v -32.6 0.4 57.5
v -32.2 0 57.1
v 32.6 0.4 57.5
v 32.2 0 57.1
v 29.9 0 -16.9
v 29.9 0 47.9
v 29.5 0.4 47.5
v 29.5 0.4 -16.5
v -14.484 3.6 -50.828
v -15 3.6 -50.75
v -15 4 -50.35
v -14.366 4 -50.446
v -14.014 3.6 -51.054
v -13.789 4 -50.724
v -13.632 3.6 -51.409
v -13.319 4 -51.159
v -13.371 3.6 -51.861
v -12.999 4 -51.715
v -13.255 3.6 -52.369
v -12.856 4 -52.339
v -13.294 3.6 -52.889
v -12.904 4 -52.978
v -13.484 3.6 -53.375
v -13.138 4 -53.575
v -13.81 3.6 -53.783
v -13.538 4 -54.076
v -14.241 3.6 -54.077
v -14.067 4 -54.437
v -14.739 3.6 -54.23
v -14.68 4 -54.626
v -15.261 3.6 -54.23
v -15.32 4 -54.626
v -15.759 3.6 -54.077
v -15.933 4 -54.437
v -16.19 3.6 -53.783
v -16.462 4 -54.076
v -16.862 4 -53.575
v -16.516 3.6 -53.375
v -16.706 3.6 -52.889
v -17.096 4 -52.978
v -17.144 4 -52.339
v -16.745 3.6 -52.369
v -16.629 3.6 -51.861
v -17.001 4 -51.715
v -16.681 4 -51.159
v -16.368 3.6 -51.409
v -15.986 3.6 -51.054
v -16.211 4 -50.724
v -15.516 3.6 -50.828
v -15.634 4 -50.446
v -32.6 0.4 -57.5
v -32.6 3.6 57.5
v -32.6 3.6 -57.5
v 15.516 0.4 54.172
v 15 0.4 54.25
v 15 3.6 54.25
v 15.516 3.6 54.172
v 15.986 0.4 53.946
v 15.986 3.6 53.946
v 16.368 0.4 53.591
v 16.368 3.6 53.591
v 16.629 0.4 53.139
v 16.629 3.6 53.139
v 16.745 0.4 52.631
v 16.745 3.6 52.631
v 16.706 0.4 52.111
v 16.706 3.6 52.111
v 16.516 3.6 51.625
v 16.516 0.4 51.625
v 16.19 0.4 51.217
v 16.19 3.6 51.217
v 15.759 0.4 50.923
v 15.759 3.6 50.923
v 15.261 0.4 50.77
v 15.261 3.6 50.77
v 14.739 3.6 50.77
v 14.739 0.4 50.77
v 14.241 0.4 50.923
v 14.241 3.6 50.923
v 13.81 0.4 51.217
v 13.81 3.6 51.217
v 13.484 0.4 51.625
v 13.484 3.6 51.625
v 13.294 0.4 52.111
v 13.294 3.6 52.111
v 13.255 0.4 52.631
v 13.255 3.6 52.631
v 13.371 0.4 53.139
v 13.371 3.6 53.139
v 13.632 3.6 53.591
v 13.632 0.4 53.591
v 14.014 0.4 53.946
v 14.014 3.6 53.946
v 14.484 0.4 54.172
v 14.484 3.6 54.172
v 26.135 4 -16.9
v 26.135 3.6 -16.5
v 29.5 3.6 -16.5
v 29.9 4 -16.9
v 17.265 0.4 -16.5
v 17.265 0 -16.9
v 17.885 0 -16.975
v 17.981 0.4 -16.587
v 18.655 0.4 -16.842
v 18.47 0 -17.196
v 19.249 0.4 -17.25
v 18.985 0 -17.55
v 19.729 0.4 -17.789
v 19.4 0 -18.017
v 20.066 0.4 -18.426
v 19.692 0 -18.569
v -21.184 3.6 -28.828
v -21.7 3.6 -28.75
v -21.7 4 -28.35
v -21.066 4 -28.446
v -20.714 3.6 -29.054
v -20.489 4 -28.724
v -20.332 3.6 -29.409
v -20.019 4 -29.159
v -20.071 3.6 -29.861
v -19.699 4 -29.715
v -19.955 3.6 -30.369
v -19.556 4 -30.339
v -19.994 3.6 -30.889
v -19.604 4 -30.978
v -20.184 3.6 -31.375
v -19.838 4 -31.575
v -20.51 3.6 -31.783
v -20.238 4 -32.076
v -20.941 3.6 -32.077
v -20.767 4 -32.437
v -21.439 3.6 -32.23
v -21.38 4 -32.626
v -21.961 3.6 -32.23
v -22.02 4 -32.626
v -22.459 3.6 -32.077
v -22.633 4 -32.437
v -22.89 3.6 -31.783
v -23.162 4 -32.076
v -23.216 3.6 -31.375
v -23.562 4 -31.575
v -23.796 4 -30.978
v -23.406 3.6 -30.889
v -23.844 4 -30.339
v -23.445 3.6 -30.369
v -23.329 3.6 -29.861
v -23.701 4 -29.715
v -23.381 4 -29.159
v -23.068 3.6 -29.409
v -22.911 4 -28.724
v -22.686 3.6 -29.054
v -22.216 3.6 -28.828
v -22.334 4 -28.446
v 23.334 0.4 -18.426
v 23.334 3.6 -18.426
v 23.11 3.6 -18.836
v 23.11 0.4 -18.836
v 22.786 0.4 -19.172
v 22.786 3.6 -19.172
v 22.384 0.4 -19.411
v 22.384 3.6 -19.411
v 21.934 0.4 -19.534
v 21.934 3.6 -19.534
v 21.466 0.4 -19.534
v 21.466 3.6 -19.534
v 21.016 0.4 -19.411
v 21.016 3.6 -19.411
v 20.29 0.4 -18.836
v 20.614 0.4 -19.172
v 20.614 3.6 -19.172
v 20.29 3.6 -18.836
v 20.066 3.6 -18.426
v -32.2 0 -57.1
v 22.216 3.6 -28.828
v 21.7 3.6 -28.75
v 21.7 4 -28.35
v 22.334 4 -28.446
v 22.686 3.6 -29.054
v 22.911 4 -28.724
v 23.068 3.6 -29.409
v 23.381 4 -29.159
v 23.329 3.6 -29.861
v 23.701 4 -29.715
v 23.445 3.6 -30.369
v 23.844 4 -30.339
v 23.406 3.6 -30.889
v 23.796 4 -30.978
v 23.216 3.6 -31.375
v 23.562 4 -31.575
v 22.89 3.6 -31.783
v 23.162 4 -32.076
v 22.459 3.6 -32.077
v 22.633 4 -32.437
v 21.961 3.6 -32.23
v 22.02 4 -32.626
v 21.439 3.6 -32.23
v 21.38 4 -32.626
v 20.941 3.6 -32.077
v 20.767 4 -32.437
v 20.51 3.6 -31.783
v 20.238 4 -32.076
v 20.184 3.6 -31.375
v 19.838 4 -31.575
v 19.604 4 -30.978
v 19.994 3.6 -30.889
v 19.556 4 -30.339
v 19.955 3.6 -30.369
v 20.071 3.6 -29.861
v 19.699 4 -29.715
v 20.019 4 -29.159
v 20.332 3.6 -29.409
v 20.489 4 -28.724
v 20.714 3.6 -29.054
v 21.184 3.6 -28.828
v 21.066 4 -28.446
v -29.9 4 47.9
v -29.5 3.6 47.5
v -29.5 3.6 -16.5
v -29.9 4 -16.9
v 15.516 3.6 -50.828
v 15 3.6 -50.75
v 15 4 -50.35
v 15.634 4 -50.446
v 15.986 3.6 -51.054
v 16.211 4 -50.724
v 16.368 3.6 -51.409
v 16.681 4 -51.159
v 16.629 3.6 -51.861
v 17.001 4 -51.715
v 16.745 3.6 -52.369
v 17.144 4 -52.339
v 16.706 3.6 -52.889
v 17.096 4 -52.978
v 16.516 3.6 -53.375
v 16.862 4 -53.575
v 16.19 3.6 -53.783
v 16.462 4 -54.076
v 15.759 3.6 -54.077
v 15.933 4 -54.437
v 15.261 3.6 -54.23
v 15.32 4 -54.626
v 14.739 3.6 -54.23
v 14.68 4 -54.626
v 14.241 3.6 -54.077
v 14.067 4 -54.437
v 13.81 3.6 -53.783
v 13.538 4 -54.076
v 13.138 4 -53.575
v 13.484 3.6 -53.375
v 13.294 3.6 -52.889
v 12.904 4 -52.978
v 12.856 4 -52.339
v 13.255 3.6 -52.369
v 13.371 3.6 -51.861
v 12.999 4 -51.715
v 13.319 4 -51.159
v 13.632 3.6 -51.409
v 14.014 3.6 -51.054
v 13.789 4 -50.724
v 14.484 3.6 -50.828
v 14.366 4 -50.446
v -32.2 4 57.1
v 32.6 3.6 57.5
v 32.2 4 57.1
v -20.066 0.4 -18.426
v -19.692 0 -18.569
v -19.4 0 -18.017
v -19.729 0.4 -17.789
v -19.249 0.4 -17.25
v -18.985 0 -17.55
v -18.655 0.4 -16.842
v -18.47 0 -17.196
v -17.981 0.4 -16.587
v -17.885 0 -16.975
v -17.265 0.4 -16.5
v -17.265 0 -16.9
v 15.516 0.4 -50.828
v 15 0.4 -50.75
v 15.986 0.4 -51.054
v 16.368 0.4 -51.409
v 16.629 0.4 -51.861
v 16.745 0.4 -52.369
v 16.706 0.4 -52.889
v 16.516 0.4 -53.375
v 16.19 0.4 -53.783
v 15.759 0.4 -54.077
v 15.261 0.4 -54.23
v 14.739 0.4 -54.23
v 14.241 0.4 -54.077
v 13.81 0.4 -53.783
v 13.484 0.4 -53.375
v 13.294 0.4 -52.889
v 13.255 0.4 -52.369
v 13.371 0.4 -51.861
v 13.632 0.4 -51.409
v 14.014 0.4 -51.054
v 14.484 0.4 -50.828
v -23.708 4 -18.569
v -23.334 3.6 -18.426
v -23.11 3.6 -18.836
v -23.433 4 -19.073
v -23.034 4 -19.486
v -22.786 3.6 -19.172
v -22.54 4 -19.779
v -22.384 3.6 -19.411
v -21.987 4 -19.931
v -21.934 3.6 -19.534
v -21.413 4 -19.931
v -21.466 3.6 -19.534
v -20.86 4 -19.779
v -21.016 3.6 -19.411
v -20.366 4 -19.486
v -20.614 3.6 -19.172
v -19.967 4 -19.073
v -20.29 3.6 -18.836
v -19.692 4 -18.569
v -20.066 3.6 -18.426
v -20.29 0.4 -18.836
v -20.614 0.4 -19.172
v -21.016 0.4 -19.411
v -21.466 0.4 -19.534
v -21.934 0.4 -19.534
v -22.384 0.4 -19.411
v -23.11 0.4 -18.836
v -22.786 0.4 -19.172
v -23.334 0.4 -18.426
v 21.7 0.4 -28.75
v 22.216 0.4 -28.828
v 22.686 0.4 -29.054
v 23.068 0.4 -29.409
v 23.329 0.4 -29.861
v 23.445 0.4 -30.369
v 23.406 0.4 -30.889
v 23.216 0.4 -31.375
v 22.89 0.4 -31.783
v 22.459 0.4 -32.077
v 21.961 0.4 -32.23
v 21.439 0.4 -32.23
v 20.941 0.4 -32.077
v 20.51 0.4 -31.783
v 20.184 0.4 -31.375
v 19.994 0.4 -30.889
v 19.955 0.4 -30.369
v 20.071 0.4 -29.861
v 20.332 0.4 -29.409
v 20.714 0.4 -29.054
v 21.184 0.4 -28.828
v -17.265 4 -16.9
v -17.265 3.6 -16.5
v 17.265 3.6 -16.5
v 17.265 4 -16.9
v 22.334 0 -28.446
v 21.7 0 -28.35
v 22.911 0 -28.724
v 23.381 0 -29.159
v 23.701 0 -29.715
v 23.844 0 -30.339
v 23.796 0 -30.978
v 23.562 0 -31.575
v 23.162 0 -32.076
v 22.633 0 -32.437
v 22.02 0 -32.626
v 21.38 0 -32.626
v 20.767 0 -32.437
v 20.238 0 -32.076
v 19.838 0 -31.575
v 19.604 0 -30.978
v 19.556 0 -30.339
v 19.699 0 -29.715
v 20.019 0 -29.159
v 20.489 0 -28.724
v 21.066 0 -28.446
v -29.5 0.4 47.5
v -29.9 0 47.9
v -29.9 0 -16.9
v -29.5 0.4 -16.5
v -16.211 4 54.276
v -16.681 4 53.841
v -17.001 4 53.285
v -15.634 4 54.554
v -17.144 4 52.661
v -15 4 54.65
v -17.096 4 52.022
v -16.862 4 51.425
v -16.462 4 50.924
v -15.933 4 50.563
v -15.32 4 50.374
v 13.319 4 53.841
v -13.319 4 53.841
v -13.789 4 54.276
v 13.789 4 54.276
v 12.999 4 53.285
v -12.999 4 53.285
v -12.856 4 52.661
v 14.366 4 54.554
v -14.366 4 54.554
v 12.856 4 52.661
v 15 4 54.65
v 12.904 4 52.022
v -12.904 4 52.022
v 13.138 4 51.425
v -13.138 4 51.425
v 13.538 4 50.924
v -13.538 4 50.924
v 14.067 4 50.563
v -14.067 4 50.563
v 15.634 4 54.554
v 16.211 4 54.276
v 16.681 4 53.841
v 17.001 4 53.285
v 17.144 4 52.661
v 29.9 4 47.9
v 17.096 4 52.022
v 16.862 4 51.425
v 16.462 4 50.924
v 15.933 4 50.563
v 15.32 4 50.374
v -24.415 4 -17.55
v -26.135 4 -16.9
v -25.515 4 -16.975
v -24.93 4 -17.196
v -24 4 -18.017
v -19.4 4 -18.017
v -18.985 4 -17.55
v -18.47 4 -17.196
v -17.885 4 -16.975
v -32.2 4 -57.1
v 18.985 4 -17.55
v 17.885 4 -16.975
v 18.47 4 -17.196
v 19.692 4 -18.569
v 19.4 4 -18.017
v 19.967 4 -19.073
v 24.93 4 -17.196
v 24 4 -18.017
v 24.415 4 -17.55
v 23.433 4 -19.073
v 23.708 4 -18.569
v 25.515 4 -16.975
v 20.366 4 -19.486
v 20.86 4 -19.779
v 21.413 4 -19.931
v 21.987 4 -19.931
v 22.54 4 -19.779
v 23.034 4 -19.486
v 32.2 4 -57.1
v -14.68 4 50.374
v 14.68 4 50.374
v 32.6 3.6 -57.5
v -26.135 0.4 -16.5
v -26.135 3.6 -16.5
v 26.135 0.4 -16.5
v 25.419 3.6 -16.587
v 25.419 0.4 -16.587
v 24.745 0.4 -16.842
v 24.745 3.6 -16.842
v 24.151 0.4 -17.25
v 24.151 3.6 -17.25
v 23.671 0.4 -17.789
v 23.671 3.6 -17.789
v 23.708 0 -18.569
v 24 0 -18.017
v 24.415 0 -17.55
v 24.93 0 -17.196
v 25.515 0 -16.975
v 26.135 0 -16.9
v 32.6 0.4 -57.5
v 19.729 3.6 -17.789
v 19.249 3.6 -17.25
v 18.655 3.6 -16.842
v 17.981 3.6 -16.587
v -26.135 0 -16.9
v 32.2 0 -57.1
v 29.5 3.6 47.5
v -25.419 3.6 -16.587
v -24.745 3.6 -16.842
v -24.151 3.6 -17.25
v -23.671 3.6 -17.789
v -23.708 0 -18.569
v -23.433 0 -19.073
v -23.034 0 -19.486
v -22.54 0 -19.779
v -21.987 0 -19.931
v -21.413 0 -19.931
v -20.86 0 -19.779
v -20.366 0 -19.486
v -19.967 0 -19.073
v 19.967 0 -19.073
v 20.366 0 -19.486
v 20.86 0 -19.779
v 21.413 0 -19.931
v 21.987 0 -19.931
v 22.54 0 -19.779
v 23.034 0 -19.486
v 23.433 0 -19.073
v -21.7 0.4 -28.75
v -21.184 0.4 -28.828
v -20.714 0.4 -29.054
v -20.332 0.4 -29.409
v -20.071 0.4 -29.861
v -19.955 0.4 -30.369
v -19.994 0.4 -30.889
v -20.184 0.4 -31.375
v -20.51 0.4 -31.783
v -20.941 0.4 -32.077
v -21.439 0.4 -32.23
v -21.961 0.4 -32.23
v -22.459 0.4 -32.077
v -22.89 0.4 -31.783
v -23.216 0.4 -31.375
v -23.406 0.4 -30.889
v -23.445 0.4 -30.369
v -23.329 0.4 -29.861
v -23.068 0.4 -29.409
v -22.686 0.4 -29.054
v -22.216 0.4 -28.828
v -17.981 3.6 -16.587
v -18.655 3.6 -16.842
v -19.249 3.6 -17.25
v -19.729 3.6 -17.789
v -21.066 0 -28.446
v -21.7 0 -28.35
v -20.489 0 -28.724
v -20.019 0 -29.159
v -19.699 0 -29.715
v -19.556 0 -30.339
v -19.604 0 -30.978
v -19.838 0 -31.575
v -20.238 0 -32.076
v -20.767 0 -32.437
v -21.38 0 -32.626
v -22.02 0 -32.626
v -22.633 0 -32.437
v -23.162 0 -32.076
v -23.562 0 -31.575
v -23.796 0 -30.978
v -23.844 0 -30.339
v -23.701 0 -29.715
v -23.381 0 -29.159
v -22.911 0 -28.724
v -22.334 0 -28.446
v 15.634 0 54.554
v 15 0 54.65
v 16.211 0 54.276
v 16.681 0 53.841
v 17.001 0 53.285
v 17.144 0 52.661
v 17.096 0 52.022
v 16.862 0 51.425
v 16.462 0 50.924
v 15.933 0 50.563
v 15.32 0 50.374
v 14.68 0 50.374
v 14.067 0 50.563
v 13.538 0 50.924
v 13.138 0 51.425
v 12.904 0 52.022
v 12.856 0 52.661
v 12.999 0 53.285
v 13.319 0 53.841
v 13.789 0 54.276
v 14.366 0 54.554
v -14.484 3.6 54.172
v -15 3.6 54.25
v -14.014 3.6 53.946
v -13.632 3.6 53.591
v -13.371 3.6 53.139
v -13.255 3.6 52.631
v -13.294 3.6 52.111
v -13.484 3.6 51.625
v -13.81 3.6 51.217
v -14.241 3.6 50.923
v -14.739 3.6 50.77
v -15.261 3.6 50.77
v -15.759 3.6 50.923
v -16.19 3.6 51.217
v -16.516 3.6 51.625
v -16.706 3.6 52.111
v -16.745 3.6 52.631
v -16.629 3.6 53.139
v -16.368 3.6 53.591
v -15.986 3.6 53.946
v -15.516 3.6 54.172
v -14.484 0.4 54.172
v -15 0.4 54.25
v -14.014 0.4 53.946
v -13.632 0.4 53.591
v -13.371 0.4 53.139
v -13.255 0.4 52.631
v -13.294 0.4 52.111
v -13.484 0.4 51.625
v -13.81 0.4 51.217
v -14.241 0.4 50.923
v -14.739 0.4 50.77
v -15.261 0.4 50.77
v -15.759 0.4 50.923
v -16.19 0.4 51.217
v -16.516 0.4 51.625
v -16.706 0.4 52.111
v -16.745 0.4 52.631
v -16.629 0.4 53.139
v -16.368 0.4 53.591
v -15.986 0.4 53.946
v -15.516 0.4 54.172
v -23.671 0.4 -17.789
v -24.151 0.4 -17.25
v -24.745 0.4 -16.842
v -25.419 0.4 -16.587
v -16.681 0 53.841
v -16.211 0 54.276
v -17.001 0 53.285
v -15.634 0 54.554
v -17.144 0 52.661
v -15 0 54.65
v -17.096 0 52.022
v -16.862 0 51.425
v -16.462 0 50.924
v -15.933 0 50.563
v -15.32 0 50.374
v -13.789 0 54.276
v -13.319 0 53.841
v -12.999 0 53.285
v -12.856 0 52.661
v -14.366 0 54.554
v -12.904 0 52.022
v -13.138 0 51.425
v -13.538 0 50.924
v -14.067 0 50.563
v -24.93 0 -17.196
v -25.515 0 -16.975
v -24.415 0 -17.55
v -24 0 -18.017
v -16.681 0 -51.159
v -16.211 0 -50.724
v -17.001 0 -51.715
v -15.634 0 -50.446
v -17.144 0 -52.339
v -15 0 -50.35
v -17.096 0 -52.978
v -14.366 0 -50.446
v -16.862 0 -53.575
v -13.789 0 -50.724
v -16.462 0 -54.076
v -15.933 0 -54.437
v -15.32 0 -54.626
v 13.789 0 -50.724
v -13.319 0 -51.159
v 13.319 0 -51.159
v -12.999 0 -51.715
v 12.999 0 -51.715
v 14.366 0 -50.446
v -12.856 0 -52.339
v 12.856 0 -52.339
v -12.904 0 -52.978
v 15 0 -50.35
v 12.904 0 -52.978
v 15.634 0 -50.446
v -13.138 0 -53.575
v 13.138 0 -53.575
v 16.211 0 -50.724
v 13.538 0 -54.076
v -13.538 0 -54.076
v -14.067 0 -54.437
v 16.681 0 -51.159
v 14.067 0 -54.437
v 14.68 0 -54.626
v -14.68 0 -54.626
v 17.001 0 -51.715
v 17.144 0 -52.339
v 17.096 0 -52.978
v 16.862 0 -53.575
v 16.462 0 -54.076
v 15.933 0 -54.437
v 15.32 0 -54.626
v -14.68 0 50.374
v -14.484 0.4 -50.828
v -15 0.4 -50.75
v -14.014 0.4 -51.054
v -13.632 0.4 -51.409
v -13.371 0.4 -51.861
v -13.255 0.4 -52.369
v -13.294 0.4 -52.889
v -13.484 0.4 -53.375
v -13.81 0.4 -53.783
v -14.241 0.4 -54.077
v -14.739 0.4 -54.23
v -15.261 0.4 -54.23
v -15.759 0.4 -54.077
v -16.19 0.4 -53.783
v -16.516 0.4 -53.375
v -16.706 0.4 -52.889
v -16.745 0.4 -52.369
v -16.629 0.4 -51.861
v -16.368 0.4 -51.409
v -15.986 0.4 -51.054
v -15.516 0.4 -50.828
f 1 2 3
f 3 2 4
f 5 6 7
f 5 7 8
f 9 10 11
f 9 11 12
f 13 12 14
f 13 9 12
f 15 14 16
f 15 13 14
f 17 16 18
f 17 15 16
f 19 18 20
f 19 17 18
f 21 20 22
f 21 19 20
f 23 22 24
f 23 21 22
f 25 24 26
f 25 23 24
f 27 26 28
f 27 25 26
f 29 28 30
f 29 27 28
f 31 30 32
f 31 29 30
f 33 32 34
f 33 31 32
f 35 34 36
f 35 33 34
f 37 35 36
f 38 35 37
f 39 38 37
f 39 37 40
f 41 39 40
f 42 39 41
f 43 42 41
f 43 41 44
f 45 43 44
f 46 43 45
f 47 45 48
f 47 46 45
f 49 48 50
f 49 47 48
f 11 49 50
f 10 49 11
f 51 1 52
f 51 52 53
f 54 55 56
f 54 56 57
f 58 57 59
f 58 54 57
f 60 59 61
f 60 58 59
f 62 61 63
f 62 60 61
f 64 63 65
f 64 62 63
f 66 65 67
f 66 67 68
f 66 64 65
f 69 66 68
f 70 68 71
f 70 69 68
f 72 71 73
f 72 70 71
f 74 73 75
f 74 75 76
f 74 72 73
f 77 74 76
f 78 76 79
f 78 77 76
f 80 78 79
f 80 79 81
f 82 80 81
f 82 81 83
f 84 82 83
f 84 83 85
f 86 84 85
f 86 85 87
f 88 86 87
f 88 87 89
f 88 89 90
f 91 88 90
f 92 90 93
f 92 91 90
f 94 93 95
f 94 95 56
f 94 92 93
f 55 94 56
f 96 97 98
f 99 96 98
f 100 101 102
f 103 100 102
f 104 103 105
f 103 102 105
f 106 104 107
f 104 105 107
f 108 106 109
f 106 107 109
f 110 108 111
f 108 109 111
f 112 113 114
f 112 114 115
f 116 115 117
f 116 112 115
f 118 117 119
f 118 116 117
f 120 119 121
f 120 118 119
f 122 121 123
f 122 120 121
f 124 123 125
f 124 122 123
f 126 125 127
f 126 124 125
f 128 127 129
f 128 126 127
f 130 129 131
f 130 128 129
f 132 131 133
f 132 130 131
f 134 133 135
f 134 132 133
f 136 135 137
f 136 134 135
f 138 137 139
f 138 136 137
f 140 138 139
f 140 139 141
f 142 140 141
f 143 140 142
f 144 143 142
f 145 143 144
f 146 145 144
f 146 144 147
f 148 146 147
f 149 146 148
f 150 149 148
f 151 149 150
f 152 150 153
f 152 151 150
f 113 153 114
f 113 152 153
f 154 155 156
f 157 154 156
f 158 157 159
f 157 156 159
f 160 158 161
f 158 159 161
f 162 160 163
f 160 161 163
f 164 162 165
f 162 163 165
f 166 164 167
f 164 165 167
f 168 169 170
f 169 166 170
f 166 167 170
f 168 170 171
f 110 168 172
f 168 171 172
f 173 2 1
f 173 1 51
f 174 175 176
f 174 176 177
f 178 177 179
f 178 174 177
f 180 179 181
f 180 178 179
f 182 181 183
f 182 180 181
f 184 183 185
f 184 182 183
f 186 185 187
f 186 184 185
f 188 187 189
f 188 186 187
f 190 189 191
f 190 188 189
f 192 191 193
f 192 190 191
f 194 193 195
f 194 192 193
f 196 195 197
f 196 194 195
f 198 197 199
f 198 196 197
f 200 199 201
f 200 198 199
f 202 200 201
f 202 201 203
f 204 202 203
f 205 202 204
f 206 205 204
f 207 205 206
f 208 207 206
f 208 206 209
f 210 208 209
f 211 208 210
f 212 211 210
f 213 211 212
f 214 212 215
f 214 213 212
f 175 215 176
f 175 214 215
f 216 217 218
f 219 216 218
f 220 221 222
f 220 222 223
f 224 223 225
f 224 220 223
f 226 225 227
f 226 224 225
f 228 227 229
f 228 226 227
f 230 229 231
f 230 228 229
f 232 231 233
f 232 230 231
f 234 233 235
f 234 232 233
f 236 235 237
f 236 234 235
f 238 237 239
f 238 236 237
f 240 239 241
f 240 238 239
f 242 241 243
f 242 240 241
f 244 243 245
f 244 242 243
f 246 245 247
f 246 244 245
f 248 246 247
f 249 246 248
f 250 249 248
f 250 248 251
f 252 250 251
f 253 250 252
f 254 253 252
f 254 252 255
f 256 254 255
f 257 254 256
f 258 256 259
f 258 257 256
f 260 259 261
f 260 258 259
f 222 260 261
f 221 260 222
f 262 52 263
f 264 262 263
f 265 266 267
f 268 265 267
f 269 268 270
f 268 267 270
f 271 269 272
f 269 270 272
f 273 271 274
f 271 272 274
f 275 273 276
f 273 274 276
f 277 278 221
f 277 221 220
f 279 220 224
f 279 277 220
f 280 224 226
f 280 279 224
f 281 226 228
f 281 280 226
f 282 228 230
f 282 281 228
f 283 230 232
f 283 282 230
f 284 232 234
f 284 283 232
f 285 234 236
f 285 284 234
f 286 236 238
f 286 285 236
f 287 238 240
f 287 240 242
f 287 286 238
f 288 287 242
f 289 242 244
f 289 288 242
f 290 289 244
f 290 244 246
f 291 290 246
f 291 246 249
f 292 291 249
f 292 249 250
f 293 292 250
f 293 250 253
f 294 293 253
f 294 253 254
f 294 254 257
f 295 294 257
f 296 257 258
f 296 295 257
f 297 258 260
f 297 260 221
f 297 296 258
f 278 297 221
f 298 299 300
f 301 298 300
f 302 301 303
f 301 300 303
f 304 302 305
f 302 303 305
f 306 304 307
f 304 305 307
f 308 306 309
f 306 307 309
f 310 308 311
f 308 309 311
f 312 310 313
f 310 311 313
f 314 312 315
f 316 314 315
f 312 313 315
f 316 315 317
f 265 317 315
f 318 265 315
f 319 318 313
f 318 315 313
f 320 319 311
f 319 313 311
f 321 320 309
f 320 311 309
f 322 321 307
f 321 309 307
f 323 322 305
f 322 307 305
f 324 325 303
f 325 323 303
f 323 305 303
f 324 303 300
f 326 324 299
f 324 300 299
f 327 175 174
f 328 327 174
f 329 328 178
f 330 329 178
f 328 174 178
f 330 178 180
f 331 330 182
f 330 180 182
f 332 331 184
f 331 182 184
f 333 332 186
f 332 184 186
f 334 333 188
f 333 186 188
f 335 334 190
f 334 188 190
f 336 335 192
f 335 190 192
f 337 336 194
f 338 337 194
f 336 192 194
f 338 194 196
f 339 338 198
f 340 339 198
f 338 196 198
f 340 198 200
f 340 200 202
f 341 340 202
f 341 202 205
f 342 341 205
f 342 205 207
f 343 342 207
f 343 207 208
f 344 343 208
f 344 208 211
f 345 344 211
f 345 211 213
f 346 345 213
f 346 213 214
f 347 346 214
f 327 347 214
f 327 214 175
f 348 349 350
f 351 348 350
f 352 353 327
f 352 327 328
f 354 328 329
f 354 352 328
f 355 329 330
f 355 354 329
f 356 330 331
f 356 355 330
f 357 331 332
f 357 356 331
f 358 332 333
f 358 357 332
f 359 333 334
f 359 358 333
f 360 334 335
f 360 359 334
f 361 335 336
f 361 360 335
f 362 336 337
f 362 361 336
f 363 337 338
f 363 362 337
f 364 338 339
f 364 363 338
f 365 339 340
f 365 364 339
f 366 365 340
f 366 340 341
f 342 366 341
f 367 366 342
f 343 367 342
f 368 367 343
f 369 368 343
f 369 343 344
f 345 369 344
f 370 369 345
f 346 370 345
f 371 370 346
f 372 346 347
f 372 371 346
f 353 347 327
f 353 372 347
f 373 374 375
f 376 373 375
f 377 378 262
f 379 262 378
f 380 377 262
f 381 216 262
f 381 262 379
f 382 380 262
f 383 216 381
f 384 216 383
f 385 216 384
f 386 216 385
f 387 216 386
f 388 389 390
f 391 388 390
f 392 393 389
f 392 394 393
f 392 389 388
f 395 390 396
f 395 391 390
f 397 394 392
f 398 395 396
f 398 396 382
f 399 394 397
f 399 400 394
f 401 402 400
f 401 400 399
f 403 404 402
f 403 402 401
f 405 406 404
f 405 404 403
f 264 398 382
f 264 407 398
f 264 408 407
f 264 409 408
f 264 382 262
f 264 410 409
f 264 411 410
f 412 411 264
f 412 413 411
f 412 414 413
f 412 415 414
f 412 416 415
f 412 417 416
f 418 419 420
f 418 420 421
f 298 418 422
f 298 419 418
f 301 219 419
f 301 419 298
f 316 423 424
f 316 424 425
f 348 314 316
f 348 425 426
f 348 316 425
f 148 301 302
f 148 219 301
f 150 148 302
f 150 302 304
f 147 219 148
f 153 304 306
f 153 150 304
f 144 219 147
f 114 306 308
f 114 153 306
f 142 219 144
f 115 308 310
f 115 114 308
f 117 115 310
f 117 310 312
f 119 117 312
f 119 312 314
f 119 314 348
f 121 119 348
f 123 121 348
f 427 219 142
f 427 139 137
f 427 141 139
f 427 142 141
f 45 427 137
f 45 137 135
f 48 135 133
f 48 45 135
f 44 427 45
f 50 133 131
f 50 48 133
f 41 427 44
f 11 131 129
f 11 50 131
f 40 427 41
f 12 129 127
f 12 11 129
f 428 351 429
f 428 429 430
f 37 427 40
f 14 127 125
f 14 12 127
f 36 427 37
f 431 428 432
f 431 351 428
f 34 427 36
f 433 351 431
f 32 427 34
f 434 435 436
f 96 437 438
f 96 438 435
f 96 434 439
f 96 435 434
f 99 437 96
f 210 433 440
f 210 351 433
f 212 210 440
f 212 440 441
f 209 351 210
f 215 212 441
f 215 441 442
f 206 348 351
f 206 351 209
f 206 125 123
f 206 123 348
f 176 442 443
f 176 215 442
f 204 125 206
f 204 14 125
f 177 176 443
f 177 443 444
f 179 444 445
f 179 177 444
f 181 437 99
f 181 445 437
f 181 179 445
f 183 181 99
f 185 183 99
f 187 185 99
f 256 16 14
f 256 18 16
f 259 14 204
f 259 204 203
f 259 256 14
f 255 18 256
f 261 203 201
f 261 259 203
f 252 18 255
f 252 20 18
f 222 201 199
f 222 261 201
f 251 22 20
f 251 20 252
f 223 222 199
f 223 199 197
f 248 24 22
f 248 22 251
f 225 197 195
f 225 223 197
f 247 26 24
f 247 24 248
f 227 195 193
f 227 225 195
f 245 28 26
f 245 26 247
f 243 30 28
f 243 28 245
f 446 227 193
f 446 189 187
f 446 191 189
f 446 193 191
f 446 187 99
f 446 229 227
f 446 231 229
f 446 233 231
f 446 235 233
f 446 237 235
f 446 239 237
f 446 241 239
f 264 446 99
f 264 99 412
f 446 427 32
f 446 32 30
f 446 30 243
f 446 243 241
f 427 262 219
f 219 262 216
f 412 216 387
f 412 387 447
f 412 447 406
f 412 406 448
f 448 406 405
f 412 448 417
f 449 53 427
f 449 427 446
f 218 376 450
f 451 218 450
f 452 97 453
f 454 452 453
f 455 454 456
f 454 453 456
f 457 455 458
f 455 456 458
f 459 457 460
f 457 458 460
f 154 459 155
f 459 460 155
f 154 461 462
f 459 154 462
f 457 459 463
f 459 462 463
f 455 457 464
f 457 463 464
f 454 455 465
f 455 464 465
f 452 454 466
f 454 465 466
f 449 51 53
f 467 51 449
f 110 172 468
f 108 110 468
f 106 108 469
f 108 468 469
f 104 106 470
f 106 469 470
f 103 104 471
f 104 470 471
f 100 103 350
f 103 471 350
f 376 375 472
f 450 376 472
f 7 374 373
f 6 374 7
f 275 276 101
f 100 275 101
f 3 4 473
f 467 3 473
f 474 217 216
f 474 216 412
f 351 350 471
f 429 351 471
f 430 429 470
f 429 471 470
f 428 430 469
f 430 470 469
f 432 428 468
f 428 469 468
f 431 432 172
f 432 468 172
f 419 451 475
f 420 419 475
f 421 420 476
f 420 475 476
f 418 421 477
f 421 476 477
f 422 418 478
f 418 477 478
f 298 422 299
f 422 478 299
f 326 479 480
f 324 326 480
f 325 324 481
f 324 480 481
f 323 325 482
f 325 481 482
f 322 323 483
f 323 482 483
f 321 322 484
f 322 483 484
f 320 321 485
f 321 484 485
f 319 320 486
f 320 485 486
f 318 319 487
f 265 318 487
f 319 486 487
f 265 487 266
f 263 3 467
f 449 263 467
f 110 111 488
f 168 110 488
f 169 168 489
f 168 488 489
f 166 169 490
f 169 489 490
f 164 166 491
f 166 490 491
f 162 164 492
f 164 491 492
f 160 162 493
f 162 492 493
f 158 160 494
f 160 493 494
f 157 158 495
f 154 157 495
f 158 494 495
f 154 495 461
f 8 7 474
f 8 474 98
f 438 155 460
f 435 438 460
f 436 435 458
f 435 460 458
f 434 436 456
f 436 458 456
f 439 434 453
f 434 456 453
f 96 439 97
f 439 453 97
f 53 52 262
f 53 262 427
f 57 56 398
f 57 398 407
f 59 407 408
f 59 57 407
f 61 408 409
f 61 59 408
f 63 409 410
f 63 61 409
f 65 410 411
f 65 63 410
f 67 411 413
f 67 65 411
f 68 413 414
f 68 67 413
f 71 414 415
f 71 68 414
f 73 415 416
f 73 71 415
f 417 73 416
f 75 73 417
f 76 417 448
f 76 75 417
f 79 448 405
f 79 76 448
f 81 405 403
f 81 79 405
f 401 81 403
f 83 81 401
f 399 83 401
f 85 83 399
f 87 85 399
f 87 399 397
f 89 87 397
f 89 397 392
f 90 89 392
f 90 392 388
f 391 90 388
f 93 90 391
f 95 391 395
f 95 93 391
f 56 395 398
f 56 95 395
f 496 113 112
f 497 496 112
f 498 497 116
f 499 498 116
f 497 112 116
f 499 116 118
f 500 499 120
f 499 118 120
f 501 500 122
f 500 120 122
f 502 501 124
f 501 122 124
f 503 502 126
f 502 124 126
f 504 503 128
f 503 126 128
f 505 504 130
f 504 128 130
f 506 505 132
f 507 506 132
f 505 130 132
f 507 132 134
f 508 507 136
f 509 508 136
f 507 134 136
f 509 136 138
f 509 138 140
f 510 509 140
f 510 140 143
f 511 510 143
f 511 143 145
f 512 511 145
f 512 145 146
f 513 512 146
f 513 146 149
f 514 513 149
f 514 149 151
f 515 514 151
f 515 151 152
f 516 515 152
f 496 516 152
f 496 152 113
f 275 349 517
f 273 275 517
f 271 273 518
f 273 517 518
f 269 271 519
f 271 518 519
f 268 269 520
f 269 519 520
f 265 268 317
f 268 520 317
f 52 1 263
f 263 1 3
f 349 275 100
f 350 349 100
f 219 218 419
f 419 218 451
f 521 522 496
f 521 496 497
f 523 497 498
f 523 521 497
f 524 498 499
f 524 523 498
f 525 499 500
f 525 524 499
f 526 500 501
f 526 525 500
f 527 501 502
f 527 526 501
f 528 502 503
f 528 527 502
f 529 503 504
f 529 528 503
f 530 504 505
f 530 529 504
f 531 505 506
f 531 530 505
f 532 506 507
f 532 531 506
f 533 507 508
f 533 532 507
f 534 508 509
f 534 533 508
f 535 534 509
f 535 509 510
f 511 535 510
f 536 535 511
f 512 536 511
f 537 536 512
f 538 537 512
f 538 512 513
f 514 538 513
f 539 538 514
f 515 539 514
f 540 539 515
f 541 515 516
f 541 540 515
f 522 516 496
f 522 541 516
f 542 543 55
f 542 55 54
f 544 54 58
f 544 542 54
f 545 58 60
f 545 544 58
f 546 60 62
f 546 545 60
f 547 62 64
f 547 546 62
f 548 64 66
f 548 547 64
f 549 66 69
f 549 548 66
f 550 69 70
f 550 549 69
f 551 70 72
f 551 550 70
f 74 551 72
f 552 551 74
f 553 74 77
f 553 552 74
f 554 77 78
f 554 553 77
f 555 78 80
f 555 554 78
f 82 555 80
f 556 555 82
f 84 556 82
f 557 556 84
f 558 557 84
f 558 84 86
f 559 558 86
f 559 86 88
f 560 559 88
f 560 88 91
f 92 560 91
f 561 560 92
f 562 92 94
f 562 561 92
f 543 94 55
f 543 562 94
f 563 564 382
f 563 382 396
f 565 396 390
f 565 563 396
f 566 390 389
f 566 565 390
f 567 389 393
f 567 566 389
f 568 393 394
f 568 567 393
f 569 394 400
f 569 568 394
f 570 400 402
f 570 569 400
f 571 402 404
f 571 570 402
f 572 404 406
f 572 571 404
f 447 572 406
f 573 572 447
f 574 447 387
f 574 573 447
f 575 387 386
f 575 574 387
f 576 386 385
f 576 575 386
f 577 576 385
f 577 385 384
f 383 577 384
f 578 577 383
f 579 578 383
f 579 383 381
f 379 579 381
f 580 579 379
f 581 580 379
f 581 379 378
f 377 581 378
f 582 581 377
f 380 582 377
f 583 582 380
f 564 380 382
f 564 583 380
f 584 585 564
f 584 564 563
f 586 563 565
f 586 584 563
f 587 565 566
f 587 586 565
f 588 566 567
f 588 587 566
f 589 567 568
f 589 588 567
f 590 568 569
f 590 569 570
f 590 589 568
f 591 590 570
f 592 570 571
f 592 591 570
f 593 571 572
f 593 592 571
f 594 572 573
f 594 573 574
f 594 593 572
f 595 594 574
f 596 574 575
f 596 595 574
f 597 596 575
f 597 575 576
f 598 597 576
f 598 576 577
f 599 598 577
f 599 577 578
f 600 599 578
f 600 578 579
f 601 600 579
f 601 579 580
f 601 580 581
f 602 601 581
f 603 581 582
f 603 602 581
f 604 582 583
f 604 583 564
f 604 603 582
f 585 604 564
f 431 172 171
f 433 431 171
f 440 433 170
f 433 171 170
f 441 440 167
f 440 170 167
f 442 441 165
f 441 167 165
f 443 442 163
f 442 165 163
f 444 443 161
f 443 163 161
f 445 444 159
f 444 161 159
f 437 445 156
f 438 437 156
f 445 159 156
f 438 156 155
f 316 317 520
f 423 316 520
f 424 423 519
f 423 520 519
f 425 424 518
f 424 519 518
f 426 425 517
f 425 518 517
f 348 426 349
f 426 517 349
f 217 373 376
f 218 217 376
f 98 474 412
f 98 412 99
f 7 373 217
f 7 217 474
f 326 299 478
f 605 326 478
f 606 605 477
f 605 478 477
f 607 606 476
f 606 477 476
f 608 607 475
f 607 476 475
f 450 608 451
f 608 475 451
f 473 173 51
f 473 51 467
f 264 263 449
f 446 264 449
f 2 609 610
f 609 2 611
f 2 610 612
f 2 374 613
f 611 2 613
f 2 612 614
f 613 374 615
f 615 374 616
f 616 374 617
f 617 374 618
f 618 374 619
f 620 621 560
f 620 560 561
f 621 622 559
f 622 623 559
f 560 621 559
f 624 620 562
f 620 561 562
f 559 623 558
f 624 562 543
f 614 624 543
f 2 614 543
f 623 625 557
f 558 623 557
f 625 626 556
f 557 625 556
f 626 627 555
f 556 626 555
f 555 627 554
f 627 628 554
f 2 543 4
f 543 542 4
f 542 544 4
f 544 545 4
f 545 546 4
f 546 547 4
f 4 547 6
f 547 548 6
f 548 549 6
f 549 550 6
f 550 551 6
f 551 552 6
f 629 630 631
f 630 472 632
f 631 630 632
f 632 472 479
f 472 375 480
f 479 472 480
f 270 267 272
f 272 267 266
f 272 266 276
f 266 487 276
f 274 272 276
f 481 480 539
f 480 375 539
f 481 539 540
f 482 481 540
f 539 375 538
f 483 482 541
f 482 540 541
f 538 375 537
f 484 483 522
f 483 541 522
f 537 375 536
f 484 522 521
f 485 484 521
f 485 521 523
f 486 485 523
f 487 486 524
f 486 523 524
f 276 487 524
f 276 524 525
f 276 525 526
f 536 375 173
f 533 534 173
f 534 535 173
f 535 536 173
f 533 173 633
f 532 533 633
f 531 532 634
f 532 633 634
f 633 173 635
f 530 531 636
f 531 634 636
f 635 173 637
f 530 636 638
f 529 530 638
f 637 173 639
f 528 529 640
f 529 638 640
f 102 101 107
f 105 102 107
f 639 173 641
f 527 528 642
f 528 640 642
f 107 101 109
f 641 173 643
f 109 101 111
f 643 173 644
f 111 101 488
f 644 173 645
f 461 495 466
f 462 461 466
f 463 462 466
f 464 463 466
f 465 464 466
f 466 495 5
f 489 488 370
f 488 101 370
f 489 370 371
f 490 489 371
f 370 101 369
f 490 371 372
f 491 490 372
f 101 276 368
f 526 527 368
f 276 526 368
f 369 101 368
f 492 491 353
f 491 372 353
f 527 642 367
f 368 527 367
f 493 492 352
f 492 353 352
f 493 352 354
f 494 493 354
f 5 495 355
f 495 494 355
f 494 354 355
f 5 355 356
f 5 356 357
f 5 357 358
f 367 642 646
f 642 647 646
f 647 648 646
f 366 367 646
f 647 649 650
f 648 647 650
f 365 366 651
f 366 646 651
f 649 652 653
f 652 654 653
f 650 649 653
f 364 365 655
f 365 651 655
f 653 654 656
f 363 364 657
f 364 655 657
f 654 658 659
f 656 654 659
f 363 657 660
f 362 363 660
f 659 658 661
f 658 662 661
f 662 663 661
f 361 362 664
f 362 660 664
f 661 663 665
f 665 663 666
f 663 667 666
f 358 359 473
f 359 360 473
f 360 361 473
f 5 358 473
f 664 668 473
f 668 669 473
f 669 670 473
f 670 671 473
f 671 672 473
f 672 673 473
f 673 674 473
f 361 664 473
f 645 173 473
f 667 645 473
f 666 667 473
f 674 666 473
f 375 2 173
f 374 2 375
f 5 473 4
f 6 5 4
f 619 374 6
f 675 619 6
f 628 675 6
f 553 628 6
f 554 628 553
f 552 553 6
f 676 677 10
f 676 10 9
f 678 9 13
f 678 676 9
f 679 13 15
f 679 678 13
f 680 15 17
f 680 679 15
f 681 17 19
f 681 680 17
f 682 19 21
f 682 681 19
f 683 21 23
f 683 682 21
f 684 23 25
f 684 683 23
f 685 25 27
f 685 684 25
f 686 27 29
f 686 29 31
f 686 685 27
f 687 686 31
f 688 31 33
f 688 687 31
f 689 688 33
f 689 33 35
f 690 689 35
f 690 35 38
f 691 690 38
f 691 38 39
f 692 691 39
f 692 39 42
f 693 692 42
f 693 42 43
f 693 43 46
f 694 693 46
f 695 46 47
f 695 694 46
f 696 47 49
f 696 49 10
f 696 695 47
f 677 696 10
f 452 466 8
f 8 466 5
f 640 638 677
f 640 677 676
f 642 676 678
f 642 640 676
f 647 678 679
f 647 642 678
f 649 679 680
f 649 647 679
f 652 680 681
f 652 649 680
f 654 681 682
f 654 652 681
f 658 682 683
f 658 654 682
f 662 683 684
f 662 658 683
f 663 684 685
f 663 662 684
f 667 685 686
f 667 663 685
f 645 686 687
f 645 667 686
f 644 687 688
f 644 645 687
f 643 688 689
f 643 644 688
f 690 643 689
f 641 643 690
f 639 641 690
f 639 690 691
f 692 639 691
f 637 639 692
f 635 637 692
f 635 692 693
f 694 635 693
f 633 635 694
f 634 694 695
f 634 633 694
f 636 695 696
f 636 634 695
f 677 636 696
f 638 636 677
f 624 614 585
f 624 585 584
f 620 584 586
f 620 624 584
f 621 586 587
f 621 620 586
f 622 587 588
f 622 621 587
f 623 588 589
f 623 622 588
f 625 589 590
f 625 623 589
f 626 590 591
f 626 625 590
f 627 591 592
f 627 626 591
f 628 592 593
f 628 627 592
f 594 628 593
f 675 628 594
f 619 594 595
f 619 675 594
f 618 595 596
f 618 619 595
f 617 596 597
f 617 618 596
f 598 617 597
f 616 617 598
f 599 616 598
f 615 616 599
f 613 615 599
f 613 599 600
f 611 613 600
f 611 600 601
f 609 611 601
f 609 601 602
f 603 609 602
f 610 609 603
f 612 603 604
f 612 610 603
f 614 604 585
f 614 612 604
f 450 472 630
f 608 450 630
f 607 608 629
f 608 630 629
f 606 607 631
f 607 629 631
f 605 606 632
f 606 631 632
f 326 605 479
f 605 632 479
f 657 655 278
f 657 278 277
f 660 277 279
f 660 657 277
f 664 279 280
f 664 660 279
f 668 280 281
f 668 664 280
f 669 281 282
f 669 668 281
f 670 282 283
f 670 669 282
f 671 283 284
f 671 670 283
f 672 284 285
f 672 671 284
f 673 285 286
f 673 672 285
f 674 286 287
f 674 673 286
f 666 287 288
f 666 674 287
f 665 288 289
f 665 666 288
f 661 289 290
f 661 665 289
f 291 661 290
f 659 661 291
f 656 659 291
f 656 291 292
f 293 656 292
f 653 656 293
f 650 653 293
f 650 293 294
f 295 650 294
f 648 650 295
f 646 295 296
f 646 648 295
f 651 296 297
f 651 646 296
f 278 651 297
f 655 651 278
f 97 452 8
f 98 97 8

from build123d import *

# Parameters (mm, degrees)
SKETCH1_W           = 65.2
SKETCH1_H           = 115
SKETCH1_R           = 1.75
SKETCH1_W_2         = 59
SKETCH1_H_2         = 64
BOSS_EXTRUDE1_DEPTH = 4
SKETCH2_R           = 1.75
CUT_EXTRUDE1_DEPTH  = 67.219408031
FILLET1_R           = 3
CHAMFER1_SIZE       = 0.4


with BuildPart() as part:
    # Sketch1 → Boss-Extrude1 (new body)
    with BuildSketch(Plane(origin=(0, 0, 0), x_dir=(1, 0, 0), z_dir=(0, 1, 0))):
        Rectangle(SKETCH1_W, SKETCH1_H)
        with Locations(Location((-15, 52.5, 0), (0, 0, 270))):
            Circle(SKETCH1_R, mode=Mode.SUBTRACT)
        with Locations(Location((15, 52.5, 0), (0, 0, 270))):
            Circle(SKETCH1_R, mode=Mode.SUBTRACT)
        with Locations(Location((15, -52.5, 0), (0, 0, 270))):
            Circle(SKETCH1_R, mode=Mode.SUBTRACT)
        with Locations(Location((-15, -52.5, 0), (0, 0, 270))):
            Circle(SKETCH1_R, mode=Mode.SUBTRACT)
        with Locations((0, -15.5)):
            Rectangle(SKETCH1_W_2, SKETCH1_H_2, mode=Mode.SUBTRACT)
    extrude(amount=BOSS_EXTRUDE1_DEPTH)

    # Sketch2 → Cut-Extrude1 (cut, through all)
    with BuildSketch(Plane(origin=(0, 4, 0), x_dir=(1, 0, 0), z_dir=(0, 1, 0))):
        with Locations((-21.7, 17.8)):
            Circle(SKETCH2_R)
        with Locations((21.7, 17.8)):
            Circle(SKETCH2_R)
        with Locations(Location((21.7, 30.5, 0), (0, 0, 270))):
            Circle(SKETCH2_R)
        with Locations(Location((-21.7, 30.5, 0), (0, 0, 270))):
            Circle(SKETCH2_R)
    extrude(amount=-CUT_EXTRUDE1_DEPTH, mode=Mode.SUBTRACT)

    # Fillet1
    fillet1_edges = [part.edges().sort_by_distance(p)[0] for p in [
        (20.528462549, 2, -16.5),
        (22.871537451, 2, -16.5),
        (-22.871537451, 2, -16.5),
        (-20.528462549, 2, -16.5),
    ]]
    fillet(fillet1_edges, radius=FILLET1_R)

    # Chamfer1
    chamfer1_edges = [part.edges().sort_by_distance(p)[0] for p in [
        (32.6, 4, 0),
        (-29.5, 0, 15.5),
        (0, 0, 47.5),
        (29.5, 0, 15.5),
        (27.817684603, 0, -16.5),
        (-29.5, 4, 15.5),
        (0, 4, -57.5),
        (0, 4, 47.5),
        (29.5, 4, 15.5),
        (27.817684603, 4, -16.5),
        (-15, 0, -54.25),
        (-15, 4, -54.25),
        (15, 0, -54.25),
        (15, 4, -54.25),
        (15, 0, 50.75),
        (15, 4, 50.75),
        (-15, 0, 50.75),
        (-15, 4, 50.75),
        (-32.6, 4, 0),
        (0, 0, -57.5),
        (32.6, 0, 0),
        (0, 0, 57.5),
        (-32.6, 0, 0),
        (-21.7, 0, -32.25),
        (-21.7, 4, -32.25),
        (21.7, 0, -32.25),
        (21.7, 4, -32.25),
        (21.7, 4, -19.55),
        (21.7, 0, -19.55),
        (-21.7, 4, -19.55),
        (0, 4, -16.5),
        (-27.817684603, 4, -16.5),
        (-24.435524013, 4, -17.028052121),
        (-18.964475987, 4, -17.028052121),
        (18.964475987, 4, -17.028052121),
        (24.435524013, 4, -17.028052121),
        (0, 0, -16.5),
        (-21.7, 0, -19.55),
        (-27.817684603, 0, -16.5),
        (-24.435524013, 0, -17.028052121),
        (-18.964475987, 0, -17.028052121),
        (18.964475987, 0, -17.028052121),
        (24.435524013, 0, -17.028052121),
        (0, 4, 57.5),
    ]]
    chamfer(chamfer1_edges, length=CHAMFER1_SIZE)


solid = part.part
